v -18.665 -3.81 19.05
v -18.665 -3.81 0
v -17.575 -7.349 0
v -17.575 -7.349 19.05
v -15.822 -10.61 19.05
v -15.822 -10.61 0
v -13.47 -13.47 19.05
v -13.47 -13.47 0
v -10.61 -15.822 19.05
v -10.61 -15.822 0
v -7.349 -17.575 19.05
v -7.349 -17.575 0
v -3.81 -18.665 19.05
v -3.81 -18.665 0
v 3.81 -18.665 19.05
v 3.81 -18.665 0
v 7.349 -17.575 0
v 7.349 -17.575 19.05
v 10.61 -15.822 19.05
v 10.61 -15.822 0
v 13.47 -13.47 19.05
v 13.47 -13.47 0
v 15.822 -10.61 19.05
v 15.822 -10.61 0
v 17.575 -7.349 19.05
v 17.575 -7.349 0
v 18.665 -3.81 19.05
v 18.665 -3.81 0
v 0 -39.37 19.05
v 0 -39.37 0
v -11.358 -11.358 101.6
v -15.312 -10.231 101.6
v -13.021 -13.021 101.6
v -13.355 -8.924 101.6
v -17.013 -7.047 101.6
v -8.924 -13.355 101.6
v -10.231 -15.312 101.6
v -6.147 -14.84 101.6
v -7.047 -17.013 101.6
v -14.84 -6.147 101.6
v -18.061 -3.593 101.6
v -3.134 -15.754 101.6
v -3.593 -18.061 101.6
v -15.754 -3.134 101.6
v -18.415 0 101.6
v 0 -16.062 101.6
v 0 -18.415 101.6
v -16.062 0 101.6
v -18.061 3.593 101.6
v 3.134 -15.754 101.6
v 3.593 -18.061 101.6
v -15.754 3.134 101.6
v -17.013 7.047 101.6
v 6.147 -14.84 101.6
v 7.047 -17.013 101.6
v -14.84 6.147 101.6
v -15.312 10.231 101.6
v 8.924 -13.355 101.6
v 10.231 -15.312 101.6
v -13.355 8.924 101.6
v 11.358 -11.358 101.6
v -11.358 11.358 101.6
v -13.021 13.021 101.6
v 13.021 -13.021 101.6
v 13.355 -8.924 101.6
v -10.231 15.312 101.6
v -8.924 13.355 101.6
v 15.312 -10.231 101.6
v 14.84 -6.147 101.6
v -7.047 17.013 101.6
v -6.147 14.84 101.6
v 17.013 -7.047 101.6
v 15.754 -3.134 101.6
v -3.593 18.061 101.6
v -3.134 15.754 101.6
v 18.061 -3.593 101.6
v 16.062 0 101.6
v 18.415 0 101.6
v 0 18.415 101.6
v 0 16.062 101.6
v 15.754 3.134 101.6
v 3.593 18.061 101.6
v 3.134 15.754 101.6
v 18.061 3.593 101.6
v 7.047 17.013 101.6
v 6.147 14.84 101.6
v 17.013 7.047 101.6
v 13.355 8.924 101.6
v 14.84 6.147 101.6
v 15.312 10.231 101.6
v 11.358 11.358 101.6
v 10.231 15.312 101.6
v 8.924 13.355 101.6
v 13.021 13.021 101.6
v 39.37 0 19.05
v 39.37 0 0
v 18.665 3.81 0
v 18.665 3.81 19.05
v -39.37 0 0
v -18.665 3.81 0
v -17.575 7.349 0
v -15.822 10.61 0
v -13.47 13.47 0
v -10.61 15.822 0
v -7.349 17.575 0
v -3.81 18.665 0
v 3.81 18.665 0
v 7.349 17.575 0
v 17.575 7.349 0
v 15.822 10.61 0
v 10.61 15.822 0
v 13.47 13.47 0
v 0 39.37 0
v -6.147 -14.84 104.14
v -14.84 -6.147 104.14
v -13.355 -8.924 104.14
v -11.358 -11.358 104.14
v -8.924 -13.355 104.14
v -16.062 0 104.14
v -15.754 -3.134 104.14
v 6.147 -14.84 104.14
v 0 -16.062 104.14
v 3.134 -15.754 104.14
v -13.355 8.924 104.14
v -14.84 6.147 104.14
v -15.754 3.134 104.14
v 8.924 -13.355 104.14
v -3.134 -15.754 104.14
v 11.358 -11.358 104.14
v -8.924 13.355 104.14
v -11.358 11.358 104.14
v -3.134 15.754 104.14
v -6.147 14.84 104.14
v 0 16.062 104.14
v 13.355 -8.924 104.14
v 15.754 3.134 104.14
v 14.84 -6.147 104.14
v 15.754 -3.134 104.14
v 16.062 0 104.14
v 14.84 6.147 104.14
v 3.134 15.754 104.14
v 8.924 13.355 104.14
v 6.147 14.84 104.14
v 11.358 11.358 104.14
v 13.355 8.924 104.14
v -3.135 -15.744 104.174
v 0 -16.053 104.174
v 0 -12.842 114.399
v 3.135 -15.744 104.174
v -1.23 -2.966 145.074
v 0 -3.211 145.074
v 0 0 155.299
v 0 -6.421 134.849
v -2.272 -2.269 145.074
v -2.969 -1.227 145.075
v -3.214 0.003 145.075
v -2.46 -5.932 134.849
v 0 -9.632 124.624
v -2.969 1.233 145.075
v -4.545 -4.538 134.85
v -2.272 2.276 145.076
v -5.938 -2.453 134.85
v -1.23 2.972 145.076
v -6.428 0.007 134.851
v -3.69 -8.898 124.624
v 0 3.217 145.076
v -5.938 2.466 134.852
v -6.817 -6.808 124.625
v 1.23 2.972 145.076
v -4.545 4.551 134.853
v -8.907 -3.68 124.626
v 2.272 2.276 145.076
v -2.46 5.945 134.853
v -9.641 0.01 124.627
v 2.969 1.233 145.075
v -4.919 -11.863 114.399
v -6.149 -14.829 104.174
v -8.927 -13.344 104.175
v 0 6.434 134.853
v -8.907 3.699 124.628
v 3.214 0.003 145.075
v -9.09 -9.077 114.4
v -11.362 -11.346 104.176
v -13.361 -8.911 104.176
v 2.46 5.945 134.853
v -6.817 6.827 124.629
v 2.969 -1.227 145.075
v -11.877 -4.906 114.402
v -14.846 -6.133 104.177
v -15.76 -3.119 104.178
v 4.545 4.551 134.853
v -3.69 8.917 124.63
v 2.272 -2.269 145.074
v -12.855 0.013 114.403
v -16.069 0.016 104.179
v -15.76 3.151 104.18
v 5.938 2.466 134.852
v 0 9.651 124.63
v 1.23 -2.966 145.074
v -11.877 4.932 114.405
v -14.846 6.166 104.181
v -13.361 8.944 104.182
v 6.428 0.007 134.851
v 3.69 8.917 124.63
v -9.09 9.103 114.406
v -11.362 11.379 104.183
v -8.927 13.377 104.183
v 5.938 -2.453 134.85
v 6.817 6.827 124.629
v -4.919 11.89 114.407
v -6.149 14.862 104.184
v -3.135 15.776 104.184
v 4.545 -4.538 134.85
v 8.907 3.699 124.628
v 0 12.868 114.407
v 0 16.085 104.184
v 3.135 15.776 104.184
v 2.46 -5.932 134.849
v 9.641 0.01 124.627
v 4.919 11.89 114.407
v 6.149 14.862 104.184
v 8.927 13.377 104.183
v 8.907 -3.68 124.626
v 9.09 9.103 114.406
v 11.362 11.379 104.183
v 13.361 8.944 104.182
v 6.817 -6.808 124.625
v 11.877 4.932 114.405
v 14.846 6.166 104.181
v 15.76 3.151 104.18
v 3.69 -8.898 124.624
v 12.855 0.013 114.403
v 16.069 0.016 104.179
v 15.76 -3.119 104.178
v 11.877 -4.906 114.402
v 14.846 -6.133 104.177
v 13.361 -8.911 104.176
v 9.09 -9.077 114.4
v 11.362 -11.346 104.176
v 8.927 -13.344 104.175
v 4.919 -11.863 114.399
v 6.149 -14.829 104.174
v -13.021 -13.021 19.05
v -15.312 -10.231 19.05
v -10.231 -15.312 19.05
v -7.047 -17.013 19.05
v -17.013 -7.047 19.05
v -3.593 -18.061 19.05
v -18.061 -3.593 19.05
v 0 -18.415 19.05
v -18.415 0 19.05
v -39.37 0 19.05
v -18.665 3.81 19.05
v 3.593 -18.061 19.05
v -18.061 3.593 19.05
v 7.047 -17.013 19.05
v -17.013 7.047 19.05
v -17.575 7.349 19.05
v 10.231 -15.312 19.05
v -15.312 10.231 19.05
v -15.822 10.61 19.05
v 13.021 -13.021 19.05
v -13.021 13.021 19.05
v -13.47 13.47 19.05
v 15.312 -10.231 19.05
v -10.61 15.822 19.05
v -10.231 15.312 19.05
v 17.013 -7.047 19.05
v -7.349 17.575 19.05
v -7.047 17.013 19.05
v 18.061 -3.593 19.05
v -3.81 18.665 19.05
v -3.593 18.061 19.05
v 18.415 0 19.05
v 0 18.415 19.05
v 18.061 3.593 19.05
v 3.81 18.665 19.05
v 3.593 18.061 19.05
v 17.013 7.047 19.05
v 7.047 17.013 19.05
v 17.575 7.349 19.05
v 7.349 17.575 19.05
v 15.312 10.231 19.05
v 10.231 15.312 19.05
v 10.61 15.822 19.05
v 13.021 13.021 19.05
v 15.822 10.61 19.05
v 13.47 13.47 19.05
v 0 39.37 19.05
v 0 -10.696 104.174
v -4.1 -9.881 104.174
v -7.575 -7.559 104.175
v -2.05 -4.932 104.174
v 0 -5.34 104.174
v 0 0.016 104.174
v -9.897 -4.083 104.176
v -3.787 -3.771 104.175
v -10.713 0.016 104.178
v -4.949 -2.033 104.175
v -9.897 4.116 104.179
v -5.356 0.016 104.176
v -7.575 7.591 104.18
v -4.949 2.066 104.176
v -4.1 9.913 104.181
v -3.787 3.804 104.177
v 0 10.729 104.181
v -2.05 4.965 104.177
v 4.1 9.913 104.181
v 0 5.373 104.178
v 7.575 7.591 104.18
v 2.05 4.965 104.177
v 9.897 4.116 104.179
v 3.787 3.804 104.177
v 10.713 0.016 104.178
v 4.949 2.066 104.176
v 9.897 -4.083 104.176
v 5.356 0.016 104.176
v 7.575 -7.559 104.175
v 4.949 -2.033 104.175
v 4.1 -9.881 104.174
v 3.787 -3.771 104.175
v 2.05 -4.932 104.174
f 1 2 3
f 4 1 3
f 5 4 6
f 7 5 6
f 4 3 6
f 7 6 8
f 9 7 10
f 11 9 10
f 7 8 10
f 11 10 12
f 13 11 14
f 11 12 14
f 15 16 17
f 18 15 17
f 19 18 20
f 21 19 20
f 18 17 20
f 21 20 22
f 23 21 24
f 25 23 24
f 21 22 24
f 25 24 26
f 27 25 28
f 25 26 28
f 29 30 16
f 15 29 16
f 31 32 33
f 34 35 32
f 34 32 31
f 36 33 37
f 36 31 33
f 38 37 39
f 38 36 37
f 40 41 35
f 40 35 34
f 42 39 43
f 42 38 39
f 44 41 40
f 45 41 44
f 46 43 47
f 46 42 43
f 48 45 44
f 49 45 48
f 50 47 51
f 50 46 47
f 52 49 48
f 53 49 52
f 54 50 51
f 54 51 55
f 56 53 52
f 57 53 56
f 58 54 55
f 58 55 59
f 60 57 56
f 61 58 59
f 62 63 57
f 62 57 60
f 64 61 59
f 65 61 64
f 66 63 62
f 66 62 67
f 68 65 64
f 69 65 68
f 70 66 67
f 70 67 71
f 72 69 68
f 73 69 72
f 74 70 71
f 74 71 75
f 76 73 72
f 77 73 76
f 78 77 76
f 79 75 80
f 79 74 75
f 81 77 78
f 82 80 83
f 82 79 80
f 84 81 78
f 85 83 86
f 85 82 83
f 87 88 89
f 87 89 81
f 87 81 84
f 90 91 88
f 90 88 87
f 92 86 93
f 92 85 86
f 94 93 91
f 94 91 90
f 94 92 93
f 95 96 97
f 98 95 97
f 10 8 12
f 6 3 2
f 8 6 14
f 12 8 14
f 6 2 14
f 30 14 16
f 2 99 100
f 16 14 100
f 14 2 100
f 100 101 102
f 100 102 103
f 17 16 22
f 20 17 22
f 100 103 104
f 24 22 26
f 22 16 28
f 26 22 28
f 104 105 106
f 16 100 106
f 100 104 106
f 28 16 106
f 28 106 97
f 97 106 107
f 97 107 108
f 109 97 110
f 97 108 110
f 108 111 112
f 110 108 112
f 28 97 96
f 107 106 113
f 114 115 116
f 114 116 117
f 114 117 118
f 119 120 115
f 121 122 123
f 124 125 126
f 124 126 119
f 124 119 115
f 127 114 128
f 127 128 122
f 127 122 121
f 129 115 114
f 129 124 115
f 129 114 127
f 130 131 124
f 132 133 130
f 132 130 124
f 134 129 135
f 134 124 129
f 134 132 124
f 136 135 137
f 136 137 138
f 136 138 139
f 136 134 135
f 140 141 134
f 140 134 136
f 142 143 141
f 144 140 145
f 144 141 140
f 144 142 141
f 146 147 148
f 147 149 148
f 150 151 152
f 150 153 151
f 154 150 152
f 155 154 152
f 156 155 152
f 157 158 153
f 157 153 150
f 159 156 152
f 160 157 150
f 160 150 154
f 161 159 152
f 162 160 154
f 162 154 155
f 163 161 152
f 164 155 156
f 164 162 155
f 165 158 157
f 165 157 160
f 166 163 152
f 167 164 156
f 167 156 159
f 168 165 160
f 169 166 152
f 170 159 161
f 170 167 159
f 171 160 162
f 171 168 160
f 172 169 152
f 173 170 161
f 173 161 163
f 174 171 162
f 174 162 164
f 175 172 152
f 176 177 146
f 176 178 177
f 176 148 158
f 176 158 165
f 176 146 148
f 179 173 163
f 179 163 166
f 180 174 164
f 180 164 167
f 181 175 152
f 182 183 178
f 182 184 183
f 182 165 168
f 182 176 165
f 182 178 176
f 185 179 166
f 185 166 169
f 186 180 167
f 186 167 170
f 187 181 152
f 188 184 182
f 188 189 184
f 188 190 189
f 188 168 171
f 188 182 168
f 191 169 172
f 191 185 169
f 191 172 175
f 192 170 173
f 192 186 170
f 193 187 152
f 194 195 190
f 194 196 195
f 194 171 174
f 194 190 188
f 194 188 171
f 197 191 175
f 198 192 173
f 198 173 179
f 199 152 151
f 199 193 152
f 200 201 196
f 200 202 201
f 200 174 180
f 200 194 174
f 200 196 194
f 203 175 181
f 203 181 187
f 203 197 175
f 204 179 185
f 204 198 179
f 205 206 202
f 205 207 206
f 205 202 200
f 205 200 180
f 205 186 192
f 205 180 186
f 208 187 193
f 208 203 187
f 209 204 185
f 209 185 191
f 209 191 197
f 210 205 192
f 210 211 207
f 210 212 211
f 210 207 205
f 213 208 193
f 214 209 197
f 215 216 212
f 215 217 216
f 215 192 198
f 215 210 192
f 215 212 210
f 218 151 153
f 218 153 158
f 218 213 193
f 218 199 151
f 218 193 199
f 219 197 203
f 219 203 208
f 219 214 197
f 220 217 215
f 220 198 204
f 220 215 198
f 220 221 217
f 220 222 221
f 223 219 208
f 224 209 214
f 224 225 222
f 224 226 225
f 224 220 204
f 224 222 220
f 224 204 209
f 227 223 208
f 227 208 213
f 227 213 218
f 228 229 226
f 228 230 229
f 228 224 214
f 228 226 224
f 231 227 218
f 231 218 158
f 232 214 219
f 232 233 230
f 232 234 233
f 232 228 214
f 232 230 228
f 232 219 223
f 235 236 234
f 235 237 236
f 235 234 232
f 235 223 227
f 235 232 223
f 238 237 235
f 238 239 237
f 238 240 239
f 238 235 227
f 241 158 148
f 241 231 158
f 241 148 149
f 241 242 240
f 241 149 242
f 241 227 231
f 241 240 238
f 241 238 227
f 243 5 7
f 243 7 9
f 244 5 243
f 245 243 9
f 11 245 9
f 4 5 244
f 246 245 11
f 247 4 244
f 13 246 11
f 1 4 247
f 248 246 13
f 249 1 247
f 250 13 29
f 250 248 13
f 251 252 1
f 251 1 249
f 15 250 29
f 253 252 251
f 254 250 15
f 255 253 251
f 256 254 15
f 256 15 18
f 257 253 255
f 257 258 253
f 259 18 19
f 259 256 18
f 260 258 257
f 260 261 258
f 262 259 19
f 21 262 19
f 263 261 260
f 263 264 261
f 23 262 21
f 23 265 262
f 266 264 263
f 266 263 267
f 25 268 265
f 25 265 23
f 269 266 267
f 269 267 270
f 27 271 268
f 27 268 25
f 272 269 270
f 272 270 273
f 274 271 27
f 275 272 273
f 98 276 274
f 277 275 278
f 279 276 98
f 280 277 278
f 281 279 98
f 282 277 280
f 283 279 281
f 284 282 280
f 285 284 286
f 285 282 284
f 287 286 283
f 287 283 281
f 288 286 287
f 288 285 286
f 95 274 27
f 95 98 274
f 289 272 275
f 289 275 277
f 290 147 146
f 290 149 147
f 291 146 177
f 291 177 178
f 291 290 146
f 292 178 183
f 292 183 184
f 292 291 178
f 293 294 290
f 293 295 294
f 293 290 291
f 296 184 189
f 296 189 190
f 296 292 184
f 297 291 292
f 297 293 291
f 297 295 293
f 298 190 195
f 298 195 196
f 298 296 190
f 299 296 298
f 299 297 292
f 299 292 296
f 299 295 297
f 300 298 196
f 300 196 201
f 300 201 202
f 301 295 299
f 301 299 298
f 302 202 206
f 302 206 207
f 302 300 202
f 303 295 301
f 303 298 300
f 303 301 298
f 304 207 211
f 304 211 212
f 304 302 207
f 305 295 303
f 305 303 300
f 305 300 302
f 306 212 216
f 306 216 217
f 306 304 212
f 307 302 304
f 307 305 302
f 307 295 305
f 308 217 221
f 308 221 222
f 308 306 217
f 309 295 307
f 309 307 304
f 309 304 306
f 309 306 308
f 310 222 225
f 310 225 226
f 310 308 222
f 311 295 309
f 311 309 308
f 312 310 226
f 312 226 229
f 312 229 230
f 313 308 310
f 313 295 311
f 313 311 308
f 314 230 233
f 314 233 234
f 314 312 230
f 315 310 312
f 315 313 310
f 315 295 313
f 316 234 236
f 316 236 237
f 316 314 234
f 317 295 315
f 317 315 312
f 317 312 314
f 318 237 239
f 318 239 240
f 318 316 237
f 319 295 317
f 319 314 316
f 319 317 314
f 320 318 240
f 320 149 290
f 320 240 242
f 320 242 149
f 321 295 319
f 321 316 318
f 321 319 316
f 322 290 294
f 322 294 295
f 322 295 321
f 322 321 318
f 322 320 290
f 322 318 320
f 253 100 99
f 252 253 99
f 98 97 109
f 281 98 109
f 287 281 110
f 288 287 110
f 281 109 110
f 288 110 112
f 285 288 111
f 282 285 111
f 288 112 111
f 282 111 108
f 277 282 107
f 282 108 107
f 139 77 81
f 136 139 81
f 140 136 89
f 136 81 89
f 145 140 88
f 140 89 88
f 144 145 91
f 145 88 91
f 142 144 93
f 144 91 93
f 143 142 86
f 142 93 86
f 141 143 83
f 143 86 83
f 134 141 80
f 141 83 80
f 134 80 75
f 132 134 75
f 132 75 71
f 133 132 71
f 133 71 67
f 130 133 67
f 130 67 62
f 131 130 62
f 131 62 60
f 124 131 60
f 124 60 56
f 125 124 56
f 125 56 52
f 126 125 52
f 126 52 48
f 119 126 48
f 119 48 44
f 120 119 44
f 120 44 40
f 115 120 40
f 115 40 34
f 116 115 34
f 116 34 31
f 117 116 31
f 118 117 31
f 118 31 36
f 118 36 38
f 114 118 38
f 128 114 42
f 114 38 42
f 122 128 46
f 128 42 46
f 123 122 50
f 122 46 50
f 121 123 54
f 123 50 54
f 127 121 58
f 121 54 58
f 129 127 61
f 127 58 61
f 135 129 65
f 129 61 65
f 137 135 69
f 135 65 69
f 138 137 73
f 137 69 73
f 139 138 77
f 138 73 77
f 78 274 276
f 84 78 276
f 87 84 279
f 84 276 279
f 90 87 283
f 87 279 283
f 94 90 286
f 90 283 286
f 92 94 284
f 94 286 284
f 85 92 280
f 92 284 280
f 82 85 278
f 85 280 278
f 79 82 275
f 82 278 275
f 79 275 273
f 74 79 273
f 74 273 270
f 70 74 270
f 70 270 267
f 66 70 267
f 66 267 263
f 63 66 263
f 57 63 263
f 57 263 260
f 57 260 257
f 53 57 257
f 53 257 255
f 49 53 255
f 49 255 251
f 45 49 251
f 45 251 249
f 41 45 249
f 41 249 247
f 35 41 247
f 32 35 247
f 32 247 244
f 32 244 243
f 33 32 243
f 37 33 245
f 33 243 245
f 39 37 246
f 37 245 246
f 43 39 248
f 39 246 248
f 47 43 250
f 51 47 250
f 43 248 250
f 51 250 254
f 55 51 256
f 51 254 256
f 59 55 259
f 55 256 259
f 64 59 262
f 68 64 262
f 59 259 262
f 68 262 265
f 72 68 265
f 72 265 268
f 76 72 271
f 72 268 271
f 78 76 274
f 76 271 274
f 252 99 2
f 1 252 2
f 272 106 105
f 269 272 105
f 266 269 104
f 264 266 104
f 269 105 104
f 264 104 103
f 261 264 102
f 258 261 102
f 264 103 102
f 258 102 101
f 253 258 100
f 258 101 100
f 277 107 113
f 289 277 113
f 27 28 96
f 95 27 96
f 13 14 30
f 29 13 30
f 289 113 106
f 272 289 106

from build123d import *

# Parameters (mm, degrees)
F1_DEPTH = 19.05
F2_R     = 18.415
F3_DEPTH = 101.6
F4_R     = 16.0624803324
F5_DEPTH = 104.14


with BuildPart() as f1:
    # F0 (on Top) → F1 (new body)
    with BuildSketch(Plane.XY):
        with BuildLine():
            ThreePointArc((-18.66511184, -3.81), (-19.05, 0), (-18.66511184, 3.81))
            Line((-18.66511184, 3.81), (-39.37, 0))
            Line((-39.37, 0), (-18.66511184, -3.81))
        make_face()
        with BuildLine():
            ThreePointArc((18.66511184, -3.81), (18.9535337147, -1.9146957262), (19.05, 0))
            ThreePointArc((19.05, 0), (18.9535337147, 1.9146957262), (18.66511184, 3.81))
            ThreePointArc((18.66511184, 3.81), (13.4703841816, 13.4703841816), (3.81, 18.66511184))
            ThreePointArc((3.81, 18.66511184), (0, 19.05), (-3.81, 18.66511184))
            ThreePointArc((-3.81, 18.66511184), (-13.4703841816, 13.4703841816), (-18.66511184, 3.81))
            ThreePointArc((-18.66511184, 3.81), (-19.05, 0), (-18.66511184, -3.81))
            ThreePointArc((-18.66511184, -3.81), (-13.4703841816, -13.4703841816), (-3.81, -18.66511184))
            ThreePointArc((-3.81, -18.66511184), (0, -19.05), (3.81, -18.66511184))
            ThreePointArc((3.81, -18.66511184), (13.4703841816, -13.4703841816), (18.66511184, -3.81))
        make_face()
        with BuildLine():
            Line((0, -39.37), (3.81, -18.66511184))
            ThreePointArc((3.81, -18.66511184), (0, -19.05), (-3.81, -18.66511184))
            Line((-3.81, -18.66511184), (0, -39.37))
        make_face()
        with BuildLine():
            ThreePointArc((18.66511184, 3.81), (18.9535337147, 1.9146957262), (19.05, 0))
            ThreePointArc((19.05, 0), (18.9535337147, -1.9146957262), (18.66511184, -3.81))
            Line((18.66511184, -3.81), (39.37, 0))
            Line((39.37, 0), (18.66511184, 3.81))
        make_face()
        with BuildLine():
            ThreePointArc((-3.81, 18.66511184), (0, 19.05), (3.81, 18.66511184))
            Line((3.81, 18.66511184), (0, 39.37))
            Line((0, 39.37), (-3.81, 18.66511184))
        make_face()
    extrude(amount=F1_DEPTH)

    # F2 (on Top) → F3 (join)
    with BuildSketch(Plane.XY):
        Circle(F2_R)
    extrude(amount=F3_DEPTH)

    # F4 (on Top) → F5 (join)
    with BuildSketch(Plane.XY):
        Circle(F4_R)
    extrude(amount=F5_DEPTH)


with BuildPart() as f7:
    # F6 (on Right) → F7 (revolve)
    with BuildSketch(Plane.YZ):
        Polygon((0.0163093209, 104.1741073132), (0, 155.2990376949), (-16.0525236279, 104.1741073132), align=None)
    revolve(axis=Axis((0, 0.0081546605, 129.736572504), (0, 0.0003190091, -0.9999999491)))


solid = Compound([f1.part, f7.part])
